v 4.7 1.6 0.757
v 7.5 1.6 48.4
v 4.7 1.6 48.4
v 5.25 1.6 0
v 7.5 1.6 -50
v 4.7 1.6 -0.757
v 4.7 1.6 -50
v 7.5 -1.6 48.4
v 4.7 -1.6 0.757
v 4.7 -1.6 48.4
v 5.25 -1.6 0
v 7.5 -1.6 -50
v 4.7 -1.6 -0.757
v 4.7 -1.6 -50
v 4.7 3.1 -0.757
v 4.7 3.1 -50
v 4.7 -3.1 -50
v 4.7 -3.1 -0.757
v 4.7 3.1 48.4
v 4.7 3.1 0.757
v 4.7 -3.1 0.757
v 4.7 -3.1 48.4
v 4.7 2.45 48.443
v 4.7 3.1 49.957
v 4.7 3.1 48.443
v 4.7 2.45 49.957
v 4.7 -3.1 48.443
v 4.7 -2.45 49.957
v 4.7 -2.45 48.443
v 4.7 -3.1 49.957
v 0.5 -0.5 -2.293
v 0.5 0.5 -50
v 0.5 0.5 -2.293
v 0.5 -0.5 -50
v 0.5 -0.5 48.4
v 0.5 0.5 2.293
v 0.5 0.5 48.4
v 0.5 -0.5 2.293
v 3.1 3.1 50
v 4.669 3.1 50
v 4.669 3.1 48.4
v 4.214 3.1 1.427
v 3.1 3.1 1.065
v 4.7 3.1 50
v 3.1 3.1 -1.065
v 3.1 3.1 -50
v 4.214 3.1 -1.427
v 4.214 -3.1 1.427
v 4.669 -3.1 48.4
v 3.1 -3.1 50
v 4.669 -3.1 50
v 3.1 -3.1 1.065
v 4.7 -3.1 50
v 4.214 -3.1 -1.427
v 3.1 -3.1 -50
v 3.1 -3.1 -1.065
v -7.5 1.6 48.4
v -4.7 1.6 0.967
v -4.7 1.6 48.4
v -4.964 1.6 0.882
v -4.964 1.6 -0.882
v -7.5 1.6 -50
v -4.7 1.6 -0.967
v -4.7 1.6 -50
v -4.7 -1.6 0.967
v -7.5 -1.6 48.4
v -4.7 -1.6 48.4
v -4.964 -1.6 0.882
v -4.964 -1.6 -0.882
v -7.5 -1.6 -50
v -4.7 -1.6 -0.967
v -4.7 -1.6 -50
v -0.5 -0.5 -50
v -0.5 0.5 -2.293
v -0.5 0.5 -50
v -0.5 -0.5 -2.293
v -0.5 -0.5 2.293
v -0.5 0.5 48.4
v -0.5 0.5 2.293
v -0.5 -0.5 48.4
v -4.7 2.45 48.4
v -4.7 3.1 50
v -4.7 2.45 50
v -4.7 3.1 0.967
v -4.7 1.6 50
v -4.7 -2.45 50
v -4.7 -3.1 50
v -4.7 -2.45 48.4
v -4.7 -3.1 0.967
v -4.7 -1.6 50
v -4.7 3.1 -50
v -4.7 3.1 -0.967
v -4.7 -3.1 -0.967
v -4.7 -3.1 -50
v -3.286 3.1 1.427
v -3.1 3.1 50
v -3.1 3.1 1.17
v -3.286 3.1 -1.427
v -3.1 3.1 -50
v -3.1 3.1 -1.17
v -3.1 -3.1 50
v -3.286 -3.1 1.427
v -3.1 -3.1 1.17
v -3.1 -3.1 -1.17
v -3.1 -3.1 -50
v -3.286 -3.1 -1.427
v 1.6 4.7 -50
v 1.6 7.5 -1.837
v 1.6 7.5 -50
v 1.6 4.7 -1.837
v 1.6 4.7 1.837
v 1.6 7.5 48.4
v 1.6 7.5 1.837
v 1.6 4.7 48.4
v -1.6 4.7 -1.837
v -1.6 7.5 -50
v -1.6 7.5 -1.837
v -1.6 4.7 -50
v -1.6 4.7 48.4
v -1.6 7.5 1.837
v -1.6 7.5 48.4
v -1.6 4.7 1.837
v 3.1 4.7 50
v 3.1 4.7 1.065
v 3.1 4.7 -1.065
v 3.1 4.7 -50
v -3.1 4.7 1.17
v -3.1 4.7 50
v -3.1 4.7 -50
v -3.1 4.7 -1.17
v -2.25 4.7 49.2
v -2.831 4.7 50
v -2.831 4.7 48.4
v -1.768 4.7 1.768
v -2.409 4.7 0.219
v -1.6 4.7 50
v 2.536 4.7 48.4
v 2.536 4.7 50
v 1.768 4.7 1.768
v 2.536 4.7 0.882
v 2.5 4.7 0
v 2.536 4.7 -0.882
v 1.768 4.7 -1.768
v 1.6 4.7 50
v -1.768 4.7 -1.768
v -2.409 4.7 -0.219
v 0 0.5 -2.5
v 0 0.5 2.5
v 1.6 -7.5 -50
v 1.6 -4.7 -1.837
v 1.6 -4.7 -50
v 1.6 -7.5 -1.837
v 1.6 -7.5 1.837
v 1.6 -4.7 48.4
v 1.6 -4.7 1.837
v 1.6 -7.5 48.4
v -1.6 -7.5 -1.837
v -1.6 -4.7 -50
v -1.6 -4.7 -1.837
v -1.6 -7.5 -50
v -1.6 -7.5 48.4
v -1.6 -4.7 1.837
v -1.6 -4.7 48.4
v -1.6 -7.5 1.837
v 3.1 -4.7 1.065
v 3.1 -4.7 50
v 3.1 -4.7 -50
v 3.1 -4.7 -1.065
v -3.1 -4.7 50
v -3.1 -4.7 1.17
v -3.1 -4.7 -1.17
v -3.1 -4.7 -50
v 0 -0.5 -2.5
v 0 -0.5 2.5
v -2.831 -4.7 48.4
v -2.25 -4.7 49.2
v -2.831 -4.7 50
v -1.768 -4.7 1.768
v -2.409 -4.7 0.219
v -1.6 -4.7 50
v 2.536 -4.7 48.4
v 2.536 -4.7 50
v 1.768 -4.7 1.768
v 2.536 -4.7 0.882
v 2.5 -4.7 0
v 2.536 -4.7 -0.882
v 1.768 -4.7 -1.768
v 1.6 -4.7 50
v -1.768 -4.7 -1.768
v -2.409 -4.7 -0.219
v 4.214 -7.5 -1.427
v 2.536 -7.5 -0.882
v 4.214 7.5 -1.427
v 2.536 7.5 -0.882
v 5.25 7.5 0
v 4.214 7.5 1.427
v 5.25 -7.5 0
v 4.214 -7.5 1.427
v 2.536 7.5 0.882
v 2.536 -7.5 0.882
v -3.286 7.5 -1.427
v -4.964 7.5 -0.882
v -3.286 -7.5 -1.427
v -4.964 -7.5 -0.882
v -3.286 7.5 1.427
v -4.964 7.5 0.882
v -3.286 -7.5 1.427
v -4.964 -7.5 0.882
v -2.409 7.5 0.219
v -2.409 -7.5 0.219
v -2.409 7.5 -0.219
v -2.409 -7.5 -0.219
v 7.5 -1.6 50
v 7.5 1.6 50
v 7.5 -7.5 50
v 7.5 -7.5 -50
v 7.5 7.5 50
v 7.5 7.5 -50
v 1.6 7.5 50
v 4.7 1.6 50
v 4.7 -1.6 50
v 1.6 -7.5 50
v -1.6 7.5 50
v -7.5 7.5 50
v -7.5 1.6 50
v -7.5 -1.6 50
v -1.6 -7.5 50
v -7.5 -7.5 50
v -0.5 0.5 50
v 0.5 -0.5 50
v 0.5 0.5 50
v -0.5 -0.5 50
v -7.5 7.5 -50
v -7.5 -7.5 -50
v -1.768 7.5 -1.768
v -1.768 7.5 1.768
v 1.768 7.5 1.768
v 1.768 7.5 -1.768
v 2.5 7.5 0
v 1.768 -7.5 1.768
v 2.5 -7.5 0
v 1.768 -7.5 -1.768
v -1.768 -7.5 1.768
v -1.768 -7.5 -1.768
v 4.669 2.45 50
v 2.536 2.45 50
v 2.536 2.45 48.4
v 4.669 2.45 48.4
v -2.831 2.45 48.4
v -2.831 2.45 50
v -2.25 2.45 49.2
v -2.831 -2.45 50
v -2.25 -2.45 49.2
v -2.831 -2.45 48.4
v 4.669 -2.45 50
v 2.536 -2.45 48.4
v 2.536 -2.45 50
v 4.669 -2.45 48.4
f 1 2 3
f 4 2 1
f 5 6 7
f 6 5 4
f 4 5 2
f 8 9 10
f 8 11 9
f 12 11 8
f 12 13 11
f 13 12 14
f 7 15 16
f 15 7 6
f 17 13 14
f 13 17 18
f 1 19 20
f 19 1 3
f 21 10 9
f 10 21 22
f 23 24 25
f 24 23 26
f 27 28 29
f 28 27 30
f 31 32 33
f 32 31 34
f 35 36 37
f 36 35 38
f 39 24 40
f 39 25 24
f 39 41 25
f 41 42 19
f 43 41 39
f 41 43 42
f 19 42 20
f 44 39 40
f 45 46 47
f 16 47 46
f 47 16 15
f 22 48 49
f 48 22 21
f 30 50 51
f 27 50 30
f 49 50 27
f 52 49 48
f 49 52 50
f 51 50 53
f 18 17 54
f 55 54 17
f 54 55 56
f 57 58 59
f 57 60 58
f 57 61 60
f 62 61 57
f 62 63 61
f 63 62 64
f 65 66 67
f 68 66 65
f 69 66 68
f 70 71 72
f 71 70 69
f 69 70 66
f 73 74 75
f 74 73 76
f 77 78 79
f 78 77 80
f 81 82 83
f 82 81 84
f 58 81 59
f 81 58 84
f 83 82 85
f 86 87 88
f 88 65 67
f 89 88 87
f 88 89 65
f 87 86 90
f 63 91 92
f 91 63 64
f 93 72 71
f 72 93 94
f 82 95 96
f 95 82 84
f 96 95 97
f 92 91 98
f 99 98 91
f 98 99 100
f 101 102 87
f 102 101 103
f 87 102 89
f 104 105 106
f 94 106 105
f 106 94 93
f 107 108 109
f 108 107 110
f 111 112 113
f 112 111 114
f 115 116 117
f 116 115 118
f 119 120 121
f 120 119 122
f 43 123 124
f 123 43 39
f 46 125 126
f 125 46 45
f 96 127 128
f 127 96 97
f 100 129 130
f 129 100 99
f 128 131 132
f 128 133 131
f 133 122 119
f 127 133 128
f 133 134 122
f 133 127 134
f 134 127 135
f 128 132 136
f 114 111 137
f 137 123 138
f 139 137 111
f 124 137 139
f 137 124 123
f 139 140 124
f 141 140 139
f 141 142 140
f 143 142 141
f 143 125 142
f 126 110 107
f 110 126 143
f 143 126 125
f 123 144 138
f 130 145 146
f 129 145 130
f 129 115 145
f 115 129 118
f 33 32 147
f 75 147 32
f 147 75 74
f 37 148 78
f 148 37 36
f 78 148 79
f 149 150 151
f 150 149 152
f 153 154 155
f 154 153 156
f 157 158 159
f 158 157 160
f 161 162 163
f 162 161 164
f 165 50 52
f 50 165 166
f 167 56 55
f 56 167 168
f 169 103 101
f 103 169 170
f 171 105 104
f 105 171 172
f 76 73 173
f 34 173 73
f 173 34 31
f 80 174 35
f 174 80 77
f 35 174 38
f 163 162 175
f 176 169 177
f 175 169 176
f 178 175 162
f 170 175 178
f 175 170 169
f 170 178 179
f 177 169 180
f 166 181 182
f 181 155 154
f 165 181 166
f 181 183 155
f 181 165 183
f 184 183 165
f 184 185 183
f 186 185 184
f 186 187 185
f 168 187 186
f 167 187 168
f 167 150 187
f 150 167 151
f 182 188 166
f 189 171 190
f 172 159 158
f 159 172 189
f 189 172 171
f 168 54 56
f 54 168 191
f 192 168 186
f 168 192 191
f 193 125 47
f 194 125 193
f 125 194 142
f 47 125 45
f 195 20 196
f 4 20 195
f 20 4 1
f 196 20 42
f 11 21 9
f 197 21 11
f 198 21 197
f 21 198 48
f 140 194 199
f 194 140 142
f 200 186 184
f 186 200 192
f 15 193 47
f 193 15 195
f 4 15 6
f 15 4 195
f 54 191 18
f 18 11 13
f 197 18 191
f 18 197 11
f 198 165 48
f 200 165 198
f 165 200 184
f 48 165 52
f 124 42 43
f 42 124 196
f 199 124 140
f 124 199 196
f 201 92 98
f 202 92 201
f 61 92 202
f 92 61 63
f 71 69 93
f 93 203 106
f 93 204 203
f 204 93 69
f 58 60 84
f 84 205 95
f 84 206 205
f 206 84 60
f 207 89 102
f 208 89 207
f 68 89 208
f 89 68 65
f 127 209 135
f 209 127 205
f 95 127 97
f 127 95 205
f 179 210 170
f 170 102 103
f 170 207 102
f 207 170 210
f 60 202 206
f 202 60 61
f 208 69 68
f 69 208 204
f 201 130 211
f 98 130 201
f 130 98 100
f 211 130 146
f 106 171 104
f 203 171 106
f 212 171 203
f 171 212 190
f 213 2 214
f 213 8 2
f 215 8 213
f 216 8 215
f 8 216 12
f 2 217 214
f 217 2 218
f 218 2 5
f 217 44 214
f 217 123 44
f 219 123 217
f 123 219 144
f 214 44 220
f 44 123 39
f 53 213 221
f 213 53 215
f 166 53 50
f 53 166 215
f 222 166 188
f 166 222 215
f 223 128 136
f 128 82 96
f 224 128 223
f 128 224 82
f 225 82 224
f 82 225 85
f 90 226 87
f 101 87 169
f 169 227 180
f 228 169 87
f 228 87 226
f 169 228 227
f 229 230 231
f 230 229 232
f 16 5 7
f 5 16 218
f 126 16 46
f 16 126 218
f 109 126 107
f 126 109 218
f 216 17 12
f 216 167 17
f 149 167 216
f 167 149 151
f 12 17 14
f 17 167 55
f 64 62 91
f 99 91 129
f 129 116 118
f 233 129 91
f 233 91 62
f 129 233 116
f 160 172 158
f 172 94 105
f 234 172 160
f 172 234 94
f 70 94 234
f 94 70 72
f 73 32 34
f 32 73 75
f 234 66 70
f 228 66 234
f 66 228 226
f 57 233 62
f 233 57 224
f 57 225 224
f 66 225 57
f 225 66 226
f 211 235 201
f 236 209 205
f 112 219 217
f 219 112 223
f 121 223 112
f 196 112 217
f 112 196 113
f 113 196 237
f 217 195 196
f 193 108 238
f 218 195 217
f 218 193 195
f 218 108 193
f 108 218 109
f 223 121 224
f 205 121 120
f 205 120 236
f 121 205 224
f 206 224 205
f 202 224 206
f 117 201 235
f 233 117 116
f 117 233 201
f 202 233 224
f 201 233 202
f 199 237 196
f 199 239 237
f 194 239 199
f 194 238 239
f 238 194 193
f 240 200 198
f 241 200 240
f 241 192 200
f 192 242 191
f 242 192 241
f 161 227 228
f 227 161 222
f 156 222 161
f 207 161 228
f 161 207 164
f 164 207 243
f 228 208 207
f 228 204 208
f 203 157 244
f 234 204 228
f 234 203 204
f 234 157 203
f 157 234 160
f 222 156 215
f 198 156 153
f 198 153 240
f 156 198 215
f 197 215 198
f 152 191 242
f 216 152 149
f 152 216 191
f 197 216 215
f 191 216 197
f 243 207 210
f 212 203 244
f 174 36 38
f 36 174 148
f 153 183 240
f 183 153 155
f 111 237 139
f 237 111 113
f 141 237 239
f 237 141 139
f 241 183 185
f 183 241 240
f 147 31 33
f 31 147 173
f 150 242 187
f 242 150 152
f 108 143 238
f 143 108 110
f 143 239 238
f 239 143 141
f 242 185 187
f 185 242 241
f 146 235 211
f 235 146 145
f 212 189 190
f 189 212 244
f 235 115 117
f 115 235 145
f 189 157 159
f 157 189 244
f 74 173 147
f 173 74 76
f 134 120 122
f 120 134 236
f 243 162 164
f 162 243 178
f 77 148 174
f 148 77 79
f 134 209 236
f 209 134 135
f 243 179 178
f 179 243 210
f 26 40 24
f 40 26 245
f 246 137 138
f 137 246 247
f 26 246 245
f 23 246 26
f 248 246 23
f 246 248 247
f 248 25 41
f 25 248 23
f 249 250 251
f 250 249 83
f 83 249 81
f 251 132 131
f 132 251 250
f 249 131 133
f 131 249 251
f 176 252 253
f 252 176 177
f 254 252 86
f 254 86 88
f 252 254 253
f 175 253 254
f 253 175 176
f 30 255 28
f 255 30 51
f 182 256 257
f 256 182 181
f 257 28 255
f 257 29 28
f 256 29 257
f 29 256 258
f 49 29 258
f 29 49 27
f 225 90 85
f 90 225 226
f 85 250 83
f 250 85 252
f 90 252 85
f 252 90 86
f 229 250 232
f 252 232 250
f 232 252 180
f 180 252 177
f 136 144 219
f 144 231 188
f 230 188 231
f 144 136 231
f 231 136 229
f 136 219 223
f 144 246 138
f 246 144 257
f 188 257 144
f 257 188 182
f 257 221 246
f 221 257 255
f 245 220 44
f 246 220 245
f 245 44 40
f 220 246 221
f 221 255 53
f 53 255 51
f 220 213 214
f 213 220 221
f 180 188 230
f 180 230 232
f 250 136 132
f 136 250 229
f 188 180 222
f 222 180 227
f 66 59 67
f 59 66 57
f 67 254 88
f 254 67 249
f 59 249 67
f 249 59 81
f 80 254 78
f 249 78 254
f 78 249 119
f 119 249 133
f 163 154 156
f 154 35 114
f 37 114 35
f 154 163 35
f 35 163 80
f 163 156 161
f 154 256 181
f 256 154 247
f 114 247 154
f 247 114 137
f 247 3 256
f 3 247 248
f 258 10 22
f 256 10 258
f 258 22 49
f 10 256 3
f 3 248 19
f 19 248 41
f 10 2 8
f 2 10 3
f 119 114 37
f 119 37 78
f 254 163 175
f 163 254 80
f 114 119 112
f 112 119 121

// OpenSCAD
// Parameters
profile_width = 15; //[7.5:30:0.5]
profile_height = 15; //[7.5:30:0.5]
length = 100; //[50:200:1]
center = 1; //[0:1:1]
cornerHole = 1; //[0:1:1]
wall_thickness = 1.6; //[0.8:3.2:0.1]
slot_opening = 3.2; //[1.6:6.4:0.1]
slot_depth = 3.8; //[2:7.5:0.1]
slot_cavity_width = 6.2; //[3:10:0.1]
slot_cavity_depth = 2.2; //[1:5:0.1]
center_bore_diameter = 5; //[2.5:10:0.1]
corner_hole_diameter = 3; //[1.5:6:0.1]
corner_hole_inset = 3.75; //[2:7:0.05]
overlap = 1; //[0.5:2:0.1]

// Extrusion - complete geometry
module extrusion() {
  color("Silver") {
    difference() {
      // Main profile body
      cube([profile_width, profile_height, length], center=true);
      
      // T-slot channels
      union() {
        translate([profile_width/2 - (slot_depth + overlap*2)/2 + overlap, 0, 0])
          cube([slot_depth + overlap*2, slot_opening, length + overlap*2], center=true);
        translate([profile_width/2 - slot_depth - (slot_cavity_depth + overlap*2)/2 + overlap, 0, 0])
          cube([slot_cavity_depth + overlap*2, slot_cavity_width, length + overlap*2], center=true);
        translate([-profile_width/2 + (slot_depth + overlap*2)/2 - overlap, 0, 0])
          cube([slot_depth + overlap*2, slot_opening, length + overlap*2], center=true);
        translate([-profile_width/2 + slot_depth + (slot_cavity_depth + overlap*2)/2 - overlap, 0, 0])
          cube([slot_cavity_depth + overlap*2, slot_cavity_width, length + overlap*2], center=true);
        translate([0, profile_height/2 - (slot_depth + overlap*2)/2 + overlap, 0])
          cube([slot_opening, slot_depth + overlap*2, length + overlap*2], center=true);
        translate([0, profile_height/2 - slot_depth - (slot_cavity_depth + overlap*2)/2 + overlap, 0])
          cube([slot_cavity_width, slot_cavity_depth + overlap*2, length + overlap*2], center=true);
        translate([0, -profile_height/2 + (slot_depth + overlap*2)/2 - overlap, 0])
          cube([slot_opening, slot_depth + overlap*2, length + overlap*2], center=true);
        translate([0, -profile_height/2 + slot_depth + (slot_cavity_depth + overlap*2)/2 - overlap, 0])
          cube([slot_cavity_width, slot_cavity_depth + overlap*2, length + overlap*2], center=true);
      }
      
      // Center bore
      translate([0, 0, 0])
        rotate([90, 0, 0])
        cylinder(r=center_bore_diameter/2, h=length + overlap*2, center=true);
      
      // Corner holes
      if (cornerHole) {
        union() {
          translate([profile_width/2 - corner_hole_inset, profile_height/2 - corner_hole_inset, 0])
            rotate([90, 0, 0])
            cylinder(r=corner_hole_diameter/2, h=length + overlap*2, center=true);
          translate([-profile_width/2 + corner_hole_inset, profile_height/2 - corner_hole_inset, 0])
            rotate([90, 0, 0])
            cylinder(r=corner_hole_diameter/2, h=length + overlap*2, center=true);
          translate([-profile_width/2 + corner_hole_inset, -profile_height/2 + corner_hole_inset, 0])
            rotate([90, 0, 0])
            cylinder(r=corner_hole_diameter/2, h=length + overlap*2, center=true);
          translate([profile_width/2 - corner_hole_inset, -profile_height/2 + corner_hole_inset, 0])
            rotate([90, 0, 0])
            cylinder(r=corner_hole_diameter/2, h=length + overlap*2, center=true);
        }
      }
    }
  }
}

// Extrusion Cross Section - complete geometry
module extrusion_cross_section() {
  color("DimGray") {
    difference() {
      // Cross section body
      cube([profile_width, profile_height, wall_thickness], center=true);
      
      // Corner holes
      if (cornerHole) {
        union() {
          translate([profile_width/2 - corner_hole_inset, profile_height/2 - corner_hole_inset, 0])
            rotate([90, 0, 0])
            cylinder(r=corner_hole_diameter/2, h=wall_thickness + overlap, center=true);
          translate([-profile_width/2 + corner_hole_inset, profile_height/2 - corner_hole_inset, 0])
            rotate([90, 0, 0])
            cylinder(r=corner_hole_diameter/2, h=wall_thickness + overlap, center=true);
          translate([-profile_width/2 + corner_hole_inset, -profile_height/2 + corner_hole_inset, 0])
            rotate([90, 0, 0])
            cylinder(r=corner_hole_diameter/2, h=wall_thickness + overlap, center=true);
          translate([profile_width/2 - corner_hole_inset, -profile_height/2 + corner_hole_inset, 0])
            rotate([90, 0, 0])
            cylinder(r=corner_hole_diameter/2, h=wall_thickness + overlap, center=true);
        }
      }
    }
  }
}

// Box Corner Profile Section - complete geometry
module box_corner_profile_section() {
  color("Black") {
    cube([wall_thickness, wall_thickness, length], center=true);
  }
}

// Box Corner Profile Sections - complete geometry
module box_corner_profile_sections() {
  color("Black") {
    union() {
      translate([profile_width/2 - wall_thickness/2, profile_height/2 - wall_thickness/2, 0])
        box_corner_profile_section();
      translate([-profile_width/2 + wall_thickness/2, profile_height/2 - wall_thickness/2, 0])
        box_corner_profile_section();
      translate([profile_width/2 - wall_thickness/2, -profile_height/2 + wall_thickness/2, 0])
        box_corner_profile_section();
      translate([-profile_width/2 + wall_thickness/2, -profile_height/2 + wall_thickness/2, 0])
        box_corner_profile_section();
    }
  }
}

// Assembly
module assembly() {
  extrusion();
  translate([0, 0, length/2 - wall_thickness/2])
    extrusion_cross_section();
  box_corner_profile_sections();
}

assembly();
